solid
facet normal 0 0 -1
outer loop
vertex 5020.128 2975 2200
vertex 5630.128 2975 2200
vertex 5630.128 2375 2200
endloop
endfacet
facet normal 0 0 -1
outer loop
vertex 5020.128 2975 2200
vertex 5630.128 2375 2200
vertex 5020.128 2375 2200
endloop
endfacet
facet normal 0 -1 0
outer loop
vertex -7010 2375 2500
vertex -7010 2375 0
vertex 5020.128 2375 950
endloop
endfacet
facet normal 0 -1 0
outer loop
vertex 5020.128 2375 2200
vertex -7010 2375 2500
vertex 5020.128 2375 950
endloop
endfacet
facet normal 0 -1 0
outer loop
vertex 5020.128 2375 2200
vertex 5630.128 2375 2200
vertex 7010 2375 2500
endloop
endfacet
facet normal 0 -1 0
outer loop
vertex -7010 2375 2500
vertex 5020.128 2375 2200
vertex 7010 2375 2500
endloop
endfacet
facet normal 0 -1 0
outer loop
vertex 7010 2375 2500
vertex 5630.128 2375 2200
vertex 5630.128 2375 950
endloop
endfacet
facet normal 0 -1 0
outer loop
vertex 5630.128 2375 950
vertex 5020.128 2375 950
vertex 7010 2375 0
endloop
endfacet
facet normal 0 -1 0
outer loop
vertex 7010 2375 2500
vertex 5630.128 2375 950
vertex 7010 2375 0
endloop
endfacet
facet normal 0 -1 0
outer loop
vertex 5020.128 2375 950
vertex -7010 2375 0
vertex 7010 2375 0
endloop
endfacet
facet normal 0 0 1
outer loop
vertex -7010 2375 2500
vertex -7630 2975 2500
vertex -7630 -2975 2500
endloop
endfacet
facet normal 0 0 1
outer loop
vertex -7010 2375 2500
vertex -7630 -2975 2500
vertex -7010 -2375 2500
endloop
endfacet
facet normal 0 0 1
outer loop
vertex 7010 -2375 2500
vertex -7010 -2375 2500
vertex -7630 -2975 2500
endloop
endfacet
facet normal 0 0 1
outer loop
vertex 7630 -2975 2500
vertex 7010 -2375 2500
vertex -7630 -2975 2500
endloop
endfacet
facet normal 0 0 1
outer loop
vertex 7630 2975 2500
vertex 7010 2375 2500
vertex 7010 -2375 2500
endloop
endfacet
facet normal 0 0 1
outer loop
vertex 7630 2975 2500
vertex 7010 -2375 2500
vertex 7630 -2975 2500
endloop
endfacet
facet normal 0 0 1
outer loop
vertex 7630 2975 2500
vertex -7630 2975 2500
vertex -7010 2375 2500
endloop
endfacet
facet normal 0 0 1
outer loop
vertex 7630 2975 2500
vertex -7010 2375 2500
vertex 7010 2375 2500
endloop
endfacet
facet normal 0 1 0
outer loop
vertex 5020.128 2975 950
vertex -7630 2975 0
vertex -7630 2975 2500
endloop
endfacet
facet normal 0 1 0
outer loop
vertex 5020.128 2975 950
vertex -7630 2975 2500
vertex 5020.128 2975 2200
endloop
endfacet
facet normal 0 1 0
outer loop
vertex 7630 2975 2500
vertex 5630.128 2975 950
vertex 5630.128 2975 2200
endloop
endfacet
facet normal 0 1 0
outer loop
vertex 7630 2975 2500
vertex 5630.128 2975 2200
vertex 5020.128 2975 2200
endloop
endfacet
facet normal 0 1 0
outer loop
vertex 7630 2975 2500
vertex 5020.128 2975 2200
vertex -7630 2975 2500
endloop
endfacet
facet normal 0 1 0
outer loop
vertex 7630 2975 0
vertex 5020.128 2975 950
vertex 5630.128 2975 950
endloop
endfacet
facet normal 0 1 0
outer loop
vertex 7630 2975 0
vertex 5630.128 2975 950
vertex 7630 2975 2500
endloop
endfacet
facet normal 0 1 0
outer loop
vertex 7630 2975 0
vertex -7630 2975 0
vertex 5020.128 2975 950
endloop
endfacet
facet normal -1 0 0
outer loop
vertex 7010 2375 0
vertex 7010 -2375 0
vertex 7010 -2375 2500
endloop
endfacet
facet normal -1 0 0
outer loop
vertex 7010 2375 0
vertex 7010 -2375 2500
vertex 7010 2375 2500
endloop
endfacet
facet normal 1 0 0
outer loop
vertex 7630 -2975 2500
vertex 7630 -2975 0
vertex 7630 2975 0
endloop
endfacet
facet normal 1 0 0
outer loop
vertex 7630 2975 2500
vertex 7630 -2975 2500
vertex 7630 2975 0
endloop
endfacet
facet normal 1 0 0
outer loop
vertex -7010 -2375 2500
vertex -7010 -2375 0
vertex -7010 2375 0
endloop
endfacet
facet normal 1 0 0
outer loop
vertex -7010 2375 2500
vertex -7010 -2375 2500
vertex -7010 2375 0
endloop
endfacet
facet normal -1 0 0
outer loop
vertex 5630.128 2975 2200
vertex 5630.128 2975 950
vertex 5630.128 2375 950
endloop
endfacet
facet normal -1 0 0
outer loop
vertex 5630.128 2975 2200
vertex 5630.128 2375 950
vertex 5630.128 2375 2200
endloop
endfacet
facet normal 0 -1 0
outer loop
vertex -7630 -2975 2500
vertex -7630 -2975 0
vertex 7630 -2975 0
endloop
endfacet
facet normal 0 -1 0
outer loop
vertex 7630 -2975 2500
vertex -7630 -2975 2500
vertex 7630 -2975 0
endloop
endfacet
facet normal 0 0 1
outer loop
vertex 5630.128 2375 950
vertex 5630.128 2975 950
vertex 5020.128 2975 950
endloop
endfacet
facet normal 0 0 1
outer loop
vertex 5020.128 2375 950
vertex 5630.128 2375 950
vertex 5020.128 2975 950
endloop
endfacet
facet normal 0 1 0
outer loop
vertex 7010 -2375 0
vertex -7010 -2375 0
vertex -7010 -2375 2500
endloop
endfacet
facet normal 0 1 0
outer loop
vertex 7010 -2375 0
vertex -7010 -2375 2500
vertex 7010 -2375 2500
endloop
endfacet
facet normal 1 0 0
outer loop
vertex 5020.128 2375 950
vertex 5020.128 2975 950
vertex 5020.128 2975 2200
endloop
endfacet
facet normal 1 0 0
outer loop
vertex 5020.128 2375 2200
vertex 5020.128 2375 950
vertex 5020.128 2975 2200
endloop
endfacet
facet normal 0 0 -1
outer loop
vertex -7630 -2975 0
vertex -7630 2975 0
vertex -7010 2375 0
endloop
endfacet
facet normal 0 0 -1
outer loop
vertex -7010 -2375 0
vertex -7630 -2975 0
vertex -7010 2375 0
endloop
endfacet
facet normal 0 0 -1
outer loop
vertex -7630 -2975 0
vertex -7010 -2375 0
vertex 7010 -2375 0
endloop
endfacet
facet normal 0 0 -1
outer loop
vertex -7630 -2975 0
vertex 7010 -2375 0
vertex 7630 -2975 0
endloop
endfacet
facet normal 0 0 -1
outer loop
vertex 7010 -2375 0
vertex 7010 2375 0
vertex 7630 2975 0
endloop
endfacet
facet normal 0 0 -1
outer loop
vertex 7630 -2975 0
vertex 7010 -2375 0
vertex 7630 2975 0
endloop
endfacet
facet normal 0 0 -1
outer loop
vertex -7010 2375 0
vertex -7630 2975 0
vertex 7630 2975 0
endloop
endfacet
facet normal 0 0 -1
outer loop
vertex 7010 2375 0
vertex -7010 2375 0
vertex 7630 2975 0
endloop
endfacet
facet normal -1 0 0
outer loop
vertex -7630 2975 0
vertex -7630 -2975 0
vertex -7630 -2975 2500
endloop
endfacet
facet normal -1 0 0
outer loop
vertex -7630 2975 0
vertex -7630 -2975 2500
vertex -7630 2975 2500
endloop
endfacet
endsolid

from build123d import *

# Parameters (mm, degrees)
F0_W     = 15260
F0_H     = 5950
F0_W_2   = 14020
F0_H_2   = 4750
F1_DEPTH = 2500
F2_W     = 610
F2_H     = 1250
F3_DEPTH = 600


with BuildPart() as f1:
    # F0 (on Top) → F1 (new body)
    with BuildSketch(Plane.XY):
        Rectangle(F0_W, F0_H)
        Rectangle(F0_W_2, F0_H_2, mode=Mode.SUBTRACT)
    extrude(amount=F1_DEPTH)

    # F2 (on face) → F3 (cut, through all)
    with BuildSketch(Plane(origin=(0, 2975, 0), x_dir=(-1, 0, 0), z_dir=(0, 1, 0))):
        with Locations((-5325.128345, 1575)):
            Rectangle(F2_W, F2_H)
    extrude(amount=-F3_DEPTH, mode=Mode.SUBTRACT)


solid = f1.part
